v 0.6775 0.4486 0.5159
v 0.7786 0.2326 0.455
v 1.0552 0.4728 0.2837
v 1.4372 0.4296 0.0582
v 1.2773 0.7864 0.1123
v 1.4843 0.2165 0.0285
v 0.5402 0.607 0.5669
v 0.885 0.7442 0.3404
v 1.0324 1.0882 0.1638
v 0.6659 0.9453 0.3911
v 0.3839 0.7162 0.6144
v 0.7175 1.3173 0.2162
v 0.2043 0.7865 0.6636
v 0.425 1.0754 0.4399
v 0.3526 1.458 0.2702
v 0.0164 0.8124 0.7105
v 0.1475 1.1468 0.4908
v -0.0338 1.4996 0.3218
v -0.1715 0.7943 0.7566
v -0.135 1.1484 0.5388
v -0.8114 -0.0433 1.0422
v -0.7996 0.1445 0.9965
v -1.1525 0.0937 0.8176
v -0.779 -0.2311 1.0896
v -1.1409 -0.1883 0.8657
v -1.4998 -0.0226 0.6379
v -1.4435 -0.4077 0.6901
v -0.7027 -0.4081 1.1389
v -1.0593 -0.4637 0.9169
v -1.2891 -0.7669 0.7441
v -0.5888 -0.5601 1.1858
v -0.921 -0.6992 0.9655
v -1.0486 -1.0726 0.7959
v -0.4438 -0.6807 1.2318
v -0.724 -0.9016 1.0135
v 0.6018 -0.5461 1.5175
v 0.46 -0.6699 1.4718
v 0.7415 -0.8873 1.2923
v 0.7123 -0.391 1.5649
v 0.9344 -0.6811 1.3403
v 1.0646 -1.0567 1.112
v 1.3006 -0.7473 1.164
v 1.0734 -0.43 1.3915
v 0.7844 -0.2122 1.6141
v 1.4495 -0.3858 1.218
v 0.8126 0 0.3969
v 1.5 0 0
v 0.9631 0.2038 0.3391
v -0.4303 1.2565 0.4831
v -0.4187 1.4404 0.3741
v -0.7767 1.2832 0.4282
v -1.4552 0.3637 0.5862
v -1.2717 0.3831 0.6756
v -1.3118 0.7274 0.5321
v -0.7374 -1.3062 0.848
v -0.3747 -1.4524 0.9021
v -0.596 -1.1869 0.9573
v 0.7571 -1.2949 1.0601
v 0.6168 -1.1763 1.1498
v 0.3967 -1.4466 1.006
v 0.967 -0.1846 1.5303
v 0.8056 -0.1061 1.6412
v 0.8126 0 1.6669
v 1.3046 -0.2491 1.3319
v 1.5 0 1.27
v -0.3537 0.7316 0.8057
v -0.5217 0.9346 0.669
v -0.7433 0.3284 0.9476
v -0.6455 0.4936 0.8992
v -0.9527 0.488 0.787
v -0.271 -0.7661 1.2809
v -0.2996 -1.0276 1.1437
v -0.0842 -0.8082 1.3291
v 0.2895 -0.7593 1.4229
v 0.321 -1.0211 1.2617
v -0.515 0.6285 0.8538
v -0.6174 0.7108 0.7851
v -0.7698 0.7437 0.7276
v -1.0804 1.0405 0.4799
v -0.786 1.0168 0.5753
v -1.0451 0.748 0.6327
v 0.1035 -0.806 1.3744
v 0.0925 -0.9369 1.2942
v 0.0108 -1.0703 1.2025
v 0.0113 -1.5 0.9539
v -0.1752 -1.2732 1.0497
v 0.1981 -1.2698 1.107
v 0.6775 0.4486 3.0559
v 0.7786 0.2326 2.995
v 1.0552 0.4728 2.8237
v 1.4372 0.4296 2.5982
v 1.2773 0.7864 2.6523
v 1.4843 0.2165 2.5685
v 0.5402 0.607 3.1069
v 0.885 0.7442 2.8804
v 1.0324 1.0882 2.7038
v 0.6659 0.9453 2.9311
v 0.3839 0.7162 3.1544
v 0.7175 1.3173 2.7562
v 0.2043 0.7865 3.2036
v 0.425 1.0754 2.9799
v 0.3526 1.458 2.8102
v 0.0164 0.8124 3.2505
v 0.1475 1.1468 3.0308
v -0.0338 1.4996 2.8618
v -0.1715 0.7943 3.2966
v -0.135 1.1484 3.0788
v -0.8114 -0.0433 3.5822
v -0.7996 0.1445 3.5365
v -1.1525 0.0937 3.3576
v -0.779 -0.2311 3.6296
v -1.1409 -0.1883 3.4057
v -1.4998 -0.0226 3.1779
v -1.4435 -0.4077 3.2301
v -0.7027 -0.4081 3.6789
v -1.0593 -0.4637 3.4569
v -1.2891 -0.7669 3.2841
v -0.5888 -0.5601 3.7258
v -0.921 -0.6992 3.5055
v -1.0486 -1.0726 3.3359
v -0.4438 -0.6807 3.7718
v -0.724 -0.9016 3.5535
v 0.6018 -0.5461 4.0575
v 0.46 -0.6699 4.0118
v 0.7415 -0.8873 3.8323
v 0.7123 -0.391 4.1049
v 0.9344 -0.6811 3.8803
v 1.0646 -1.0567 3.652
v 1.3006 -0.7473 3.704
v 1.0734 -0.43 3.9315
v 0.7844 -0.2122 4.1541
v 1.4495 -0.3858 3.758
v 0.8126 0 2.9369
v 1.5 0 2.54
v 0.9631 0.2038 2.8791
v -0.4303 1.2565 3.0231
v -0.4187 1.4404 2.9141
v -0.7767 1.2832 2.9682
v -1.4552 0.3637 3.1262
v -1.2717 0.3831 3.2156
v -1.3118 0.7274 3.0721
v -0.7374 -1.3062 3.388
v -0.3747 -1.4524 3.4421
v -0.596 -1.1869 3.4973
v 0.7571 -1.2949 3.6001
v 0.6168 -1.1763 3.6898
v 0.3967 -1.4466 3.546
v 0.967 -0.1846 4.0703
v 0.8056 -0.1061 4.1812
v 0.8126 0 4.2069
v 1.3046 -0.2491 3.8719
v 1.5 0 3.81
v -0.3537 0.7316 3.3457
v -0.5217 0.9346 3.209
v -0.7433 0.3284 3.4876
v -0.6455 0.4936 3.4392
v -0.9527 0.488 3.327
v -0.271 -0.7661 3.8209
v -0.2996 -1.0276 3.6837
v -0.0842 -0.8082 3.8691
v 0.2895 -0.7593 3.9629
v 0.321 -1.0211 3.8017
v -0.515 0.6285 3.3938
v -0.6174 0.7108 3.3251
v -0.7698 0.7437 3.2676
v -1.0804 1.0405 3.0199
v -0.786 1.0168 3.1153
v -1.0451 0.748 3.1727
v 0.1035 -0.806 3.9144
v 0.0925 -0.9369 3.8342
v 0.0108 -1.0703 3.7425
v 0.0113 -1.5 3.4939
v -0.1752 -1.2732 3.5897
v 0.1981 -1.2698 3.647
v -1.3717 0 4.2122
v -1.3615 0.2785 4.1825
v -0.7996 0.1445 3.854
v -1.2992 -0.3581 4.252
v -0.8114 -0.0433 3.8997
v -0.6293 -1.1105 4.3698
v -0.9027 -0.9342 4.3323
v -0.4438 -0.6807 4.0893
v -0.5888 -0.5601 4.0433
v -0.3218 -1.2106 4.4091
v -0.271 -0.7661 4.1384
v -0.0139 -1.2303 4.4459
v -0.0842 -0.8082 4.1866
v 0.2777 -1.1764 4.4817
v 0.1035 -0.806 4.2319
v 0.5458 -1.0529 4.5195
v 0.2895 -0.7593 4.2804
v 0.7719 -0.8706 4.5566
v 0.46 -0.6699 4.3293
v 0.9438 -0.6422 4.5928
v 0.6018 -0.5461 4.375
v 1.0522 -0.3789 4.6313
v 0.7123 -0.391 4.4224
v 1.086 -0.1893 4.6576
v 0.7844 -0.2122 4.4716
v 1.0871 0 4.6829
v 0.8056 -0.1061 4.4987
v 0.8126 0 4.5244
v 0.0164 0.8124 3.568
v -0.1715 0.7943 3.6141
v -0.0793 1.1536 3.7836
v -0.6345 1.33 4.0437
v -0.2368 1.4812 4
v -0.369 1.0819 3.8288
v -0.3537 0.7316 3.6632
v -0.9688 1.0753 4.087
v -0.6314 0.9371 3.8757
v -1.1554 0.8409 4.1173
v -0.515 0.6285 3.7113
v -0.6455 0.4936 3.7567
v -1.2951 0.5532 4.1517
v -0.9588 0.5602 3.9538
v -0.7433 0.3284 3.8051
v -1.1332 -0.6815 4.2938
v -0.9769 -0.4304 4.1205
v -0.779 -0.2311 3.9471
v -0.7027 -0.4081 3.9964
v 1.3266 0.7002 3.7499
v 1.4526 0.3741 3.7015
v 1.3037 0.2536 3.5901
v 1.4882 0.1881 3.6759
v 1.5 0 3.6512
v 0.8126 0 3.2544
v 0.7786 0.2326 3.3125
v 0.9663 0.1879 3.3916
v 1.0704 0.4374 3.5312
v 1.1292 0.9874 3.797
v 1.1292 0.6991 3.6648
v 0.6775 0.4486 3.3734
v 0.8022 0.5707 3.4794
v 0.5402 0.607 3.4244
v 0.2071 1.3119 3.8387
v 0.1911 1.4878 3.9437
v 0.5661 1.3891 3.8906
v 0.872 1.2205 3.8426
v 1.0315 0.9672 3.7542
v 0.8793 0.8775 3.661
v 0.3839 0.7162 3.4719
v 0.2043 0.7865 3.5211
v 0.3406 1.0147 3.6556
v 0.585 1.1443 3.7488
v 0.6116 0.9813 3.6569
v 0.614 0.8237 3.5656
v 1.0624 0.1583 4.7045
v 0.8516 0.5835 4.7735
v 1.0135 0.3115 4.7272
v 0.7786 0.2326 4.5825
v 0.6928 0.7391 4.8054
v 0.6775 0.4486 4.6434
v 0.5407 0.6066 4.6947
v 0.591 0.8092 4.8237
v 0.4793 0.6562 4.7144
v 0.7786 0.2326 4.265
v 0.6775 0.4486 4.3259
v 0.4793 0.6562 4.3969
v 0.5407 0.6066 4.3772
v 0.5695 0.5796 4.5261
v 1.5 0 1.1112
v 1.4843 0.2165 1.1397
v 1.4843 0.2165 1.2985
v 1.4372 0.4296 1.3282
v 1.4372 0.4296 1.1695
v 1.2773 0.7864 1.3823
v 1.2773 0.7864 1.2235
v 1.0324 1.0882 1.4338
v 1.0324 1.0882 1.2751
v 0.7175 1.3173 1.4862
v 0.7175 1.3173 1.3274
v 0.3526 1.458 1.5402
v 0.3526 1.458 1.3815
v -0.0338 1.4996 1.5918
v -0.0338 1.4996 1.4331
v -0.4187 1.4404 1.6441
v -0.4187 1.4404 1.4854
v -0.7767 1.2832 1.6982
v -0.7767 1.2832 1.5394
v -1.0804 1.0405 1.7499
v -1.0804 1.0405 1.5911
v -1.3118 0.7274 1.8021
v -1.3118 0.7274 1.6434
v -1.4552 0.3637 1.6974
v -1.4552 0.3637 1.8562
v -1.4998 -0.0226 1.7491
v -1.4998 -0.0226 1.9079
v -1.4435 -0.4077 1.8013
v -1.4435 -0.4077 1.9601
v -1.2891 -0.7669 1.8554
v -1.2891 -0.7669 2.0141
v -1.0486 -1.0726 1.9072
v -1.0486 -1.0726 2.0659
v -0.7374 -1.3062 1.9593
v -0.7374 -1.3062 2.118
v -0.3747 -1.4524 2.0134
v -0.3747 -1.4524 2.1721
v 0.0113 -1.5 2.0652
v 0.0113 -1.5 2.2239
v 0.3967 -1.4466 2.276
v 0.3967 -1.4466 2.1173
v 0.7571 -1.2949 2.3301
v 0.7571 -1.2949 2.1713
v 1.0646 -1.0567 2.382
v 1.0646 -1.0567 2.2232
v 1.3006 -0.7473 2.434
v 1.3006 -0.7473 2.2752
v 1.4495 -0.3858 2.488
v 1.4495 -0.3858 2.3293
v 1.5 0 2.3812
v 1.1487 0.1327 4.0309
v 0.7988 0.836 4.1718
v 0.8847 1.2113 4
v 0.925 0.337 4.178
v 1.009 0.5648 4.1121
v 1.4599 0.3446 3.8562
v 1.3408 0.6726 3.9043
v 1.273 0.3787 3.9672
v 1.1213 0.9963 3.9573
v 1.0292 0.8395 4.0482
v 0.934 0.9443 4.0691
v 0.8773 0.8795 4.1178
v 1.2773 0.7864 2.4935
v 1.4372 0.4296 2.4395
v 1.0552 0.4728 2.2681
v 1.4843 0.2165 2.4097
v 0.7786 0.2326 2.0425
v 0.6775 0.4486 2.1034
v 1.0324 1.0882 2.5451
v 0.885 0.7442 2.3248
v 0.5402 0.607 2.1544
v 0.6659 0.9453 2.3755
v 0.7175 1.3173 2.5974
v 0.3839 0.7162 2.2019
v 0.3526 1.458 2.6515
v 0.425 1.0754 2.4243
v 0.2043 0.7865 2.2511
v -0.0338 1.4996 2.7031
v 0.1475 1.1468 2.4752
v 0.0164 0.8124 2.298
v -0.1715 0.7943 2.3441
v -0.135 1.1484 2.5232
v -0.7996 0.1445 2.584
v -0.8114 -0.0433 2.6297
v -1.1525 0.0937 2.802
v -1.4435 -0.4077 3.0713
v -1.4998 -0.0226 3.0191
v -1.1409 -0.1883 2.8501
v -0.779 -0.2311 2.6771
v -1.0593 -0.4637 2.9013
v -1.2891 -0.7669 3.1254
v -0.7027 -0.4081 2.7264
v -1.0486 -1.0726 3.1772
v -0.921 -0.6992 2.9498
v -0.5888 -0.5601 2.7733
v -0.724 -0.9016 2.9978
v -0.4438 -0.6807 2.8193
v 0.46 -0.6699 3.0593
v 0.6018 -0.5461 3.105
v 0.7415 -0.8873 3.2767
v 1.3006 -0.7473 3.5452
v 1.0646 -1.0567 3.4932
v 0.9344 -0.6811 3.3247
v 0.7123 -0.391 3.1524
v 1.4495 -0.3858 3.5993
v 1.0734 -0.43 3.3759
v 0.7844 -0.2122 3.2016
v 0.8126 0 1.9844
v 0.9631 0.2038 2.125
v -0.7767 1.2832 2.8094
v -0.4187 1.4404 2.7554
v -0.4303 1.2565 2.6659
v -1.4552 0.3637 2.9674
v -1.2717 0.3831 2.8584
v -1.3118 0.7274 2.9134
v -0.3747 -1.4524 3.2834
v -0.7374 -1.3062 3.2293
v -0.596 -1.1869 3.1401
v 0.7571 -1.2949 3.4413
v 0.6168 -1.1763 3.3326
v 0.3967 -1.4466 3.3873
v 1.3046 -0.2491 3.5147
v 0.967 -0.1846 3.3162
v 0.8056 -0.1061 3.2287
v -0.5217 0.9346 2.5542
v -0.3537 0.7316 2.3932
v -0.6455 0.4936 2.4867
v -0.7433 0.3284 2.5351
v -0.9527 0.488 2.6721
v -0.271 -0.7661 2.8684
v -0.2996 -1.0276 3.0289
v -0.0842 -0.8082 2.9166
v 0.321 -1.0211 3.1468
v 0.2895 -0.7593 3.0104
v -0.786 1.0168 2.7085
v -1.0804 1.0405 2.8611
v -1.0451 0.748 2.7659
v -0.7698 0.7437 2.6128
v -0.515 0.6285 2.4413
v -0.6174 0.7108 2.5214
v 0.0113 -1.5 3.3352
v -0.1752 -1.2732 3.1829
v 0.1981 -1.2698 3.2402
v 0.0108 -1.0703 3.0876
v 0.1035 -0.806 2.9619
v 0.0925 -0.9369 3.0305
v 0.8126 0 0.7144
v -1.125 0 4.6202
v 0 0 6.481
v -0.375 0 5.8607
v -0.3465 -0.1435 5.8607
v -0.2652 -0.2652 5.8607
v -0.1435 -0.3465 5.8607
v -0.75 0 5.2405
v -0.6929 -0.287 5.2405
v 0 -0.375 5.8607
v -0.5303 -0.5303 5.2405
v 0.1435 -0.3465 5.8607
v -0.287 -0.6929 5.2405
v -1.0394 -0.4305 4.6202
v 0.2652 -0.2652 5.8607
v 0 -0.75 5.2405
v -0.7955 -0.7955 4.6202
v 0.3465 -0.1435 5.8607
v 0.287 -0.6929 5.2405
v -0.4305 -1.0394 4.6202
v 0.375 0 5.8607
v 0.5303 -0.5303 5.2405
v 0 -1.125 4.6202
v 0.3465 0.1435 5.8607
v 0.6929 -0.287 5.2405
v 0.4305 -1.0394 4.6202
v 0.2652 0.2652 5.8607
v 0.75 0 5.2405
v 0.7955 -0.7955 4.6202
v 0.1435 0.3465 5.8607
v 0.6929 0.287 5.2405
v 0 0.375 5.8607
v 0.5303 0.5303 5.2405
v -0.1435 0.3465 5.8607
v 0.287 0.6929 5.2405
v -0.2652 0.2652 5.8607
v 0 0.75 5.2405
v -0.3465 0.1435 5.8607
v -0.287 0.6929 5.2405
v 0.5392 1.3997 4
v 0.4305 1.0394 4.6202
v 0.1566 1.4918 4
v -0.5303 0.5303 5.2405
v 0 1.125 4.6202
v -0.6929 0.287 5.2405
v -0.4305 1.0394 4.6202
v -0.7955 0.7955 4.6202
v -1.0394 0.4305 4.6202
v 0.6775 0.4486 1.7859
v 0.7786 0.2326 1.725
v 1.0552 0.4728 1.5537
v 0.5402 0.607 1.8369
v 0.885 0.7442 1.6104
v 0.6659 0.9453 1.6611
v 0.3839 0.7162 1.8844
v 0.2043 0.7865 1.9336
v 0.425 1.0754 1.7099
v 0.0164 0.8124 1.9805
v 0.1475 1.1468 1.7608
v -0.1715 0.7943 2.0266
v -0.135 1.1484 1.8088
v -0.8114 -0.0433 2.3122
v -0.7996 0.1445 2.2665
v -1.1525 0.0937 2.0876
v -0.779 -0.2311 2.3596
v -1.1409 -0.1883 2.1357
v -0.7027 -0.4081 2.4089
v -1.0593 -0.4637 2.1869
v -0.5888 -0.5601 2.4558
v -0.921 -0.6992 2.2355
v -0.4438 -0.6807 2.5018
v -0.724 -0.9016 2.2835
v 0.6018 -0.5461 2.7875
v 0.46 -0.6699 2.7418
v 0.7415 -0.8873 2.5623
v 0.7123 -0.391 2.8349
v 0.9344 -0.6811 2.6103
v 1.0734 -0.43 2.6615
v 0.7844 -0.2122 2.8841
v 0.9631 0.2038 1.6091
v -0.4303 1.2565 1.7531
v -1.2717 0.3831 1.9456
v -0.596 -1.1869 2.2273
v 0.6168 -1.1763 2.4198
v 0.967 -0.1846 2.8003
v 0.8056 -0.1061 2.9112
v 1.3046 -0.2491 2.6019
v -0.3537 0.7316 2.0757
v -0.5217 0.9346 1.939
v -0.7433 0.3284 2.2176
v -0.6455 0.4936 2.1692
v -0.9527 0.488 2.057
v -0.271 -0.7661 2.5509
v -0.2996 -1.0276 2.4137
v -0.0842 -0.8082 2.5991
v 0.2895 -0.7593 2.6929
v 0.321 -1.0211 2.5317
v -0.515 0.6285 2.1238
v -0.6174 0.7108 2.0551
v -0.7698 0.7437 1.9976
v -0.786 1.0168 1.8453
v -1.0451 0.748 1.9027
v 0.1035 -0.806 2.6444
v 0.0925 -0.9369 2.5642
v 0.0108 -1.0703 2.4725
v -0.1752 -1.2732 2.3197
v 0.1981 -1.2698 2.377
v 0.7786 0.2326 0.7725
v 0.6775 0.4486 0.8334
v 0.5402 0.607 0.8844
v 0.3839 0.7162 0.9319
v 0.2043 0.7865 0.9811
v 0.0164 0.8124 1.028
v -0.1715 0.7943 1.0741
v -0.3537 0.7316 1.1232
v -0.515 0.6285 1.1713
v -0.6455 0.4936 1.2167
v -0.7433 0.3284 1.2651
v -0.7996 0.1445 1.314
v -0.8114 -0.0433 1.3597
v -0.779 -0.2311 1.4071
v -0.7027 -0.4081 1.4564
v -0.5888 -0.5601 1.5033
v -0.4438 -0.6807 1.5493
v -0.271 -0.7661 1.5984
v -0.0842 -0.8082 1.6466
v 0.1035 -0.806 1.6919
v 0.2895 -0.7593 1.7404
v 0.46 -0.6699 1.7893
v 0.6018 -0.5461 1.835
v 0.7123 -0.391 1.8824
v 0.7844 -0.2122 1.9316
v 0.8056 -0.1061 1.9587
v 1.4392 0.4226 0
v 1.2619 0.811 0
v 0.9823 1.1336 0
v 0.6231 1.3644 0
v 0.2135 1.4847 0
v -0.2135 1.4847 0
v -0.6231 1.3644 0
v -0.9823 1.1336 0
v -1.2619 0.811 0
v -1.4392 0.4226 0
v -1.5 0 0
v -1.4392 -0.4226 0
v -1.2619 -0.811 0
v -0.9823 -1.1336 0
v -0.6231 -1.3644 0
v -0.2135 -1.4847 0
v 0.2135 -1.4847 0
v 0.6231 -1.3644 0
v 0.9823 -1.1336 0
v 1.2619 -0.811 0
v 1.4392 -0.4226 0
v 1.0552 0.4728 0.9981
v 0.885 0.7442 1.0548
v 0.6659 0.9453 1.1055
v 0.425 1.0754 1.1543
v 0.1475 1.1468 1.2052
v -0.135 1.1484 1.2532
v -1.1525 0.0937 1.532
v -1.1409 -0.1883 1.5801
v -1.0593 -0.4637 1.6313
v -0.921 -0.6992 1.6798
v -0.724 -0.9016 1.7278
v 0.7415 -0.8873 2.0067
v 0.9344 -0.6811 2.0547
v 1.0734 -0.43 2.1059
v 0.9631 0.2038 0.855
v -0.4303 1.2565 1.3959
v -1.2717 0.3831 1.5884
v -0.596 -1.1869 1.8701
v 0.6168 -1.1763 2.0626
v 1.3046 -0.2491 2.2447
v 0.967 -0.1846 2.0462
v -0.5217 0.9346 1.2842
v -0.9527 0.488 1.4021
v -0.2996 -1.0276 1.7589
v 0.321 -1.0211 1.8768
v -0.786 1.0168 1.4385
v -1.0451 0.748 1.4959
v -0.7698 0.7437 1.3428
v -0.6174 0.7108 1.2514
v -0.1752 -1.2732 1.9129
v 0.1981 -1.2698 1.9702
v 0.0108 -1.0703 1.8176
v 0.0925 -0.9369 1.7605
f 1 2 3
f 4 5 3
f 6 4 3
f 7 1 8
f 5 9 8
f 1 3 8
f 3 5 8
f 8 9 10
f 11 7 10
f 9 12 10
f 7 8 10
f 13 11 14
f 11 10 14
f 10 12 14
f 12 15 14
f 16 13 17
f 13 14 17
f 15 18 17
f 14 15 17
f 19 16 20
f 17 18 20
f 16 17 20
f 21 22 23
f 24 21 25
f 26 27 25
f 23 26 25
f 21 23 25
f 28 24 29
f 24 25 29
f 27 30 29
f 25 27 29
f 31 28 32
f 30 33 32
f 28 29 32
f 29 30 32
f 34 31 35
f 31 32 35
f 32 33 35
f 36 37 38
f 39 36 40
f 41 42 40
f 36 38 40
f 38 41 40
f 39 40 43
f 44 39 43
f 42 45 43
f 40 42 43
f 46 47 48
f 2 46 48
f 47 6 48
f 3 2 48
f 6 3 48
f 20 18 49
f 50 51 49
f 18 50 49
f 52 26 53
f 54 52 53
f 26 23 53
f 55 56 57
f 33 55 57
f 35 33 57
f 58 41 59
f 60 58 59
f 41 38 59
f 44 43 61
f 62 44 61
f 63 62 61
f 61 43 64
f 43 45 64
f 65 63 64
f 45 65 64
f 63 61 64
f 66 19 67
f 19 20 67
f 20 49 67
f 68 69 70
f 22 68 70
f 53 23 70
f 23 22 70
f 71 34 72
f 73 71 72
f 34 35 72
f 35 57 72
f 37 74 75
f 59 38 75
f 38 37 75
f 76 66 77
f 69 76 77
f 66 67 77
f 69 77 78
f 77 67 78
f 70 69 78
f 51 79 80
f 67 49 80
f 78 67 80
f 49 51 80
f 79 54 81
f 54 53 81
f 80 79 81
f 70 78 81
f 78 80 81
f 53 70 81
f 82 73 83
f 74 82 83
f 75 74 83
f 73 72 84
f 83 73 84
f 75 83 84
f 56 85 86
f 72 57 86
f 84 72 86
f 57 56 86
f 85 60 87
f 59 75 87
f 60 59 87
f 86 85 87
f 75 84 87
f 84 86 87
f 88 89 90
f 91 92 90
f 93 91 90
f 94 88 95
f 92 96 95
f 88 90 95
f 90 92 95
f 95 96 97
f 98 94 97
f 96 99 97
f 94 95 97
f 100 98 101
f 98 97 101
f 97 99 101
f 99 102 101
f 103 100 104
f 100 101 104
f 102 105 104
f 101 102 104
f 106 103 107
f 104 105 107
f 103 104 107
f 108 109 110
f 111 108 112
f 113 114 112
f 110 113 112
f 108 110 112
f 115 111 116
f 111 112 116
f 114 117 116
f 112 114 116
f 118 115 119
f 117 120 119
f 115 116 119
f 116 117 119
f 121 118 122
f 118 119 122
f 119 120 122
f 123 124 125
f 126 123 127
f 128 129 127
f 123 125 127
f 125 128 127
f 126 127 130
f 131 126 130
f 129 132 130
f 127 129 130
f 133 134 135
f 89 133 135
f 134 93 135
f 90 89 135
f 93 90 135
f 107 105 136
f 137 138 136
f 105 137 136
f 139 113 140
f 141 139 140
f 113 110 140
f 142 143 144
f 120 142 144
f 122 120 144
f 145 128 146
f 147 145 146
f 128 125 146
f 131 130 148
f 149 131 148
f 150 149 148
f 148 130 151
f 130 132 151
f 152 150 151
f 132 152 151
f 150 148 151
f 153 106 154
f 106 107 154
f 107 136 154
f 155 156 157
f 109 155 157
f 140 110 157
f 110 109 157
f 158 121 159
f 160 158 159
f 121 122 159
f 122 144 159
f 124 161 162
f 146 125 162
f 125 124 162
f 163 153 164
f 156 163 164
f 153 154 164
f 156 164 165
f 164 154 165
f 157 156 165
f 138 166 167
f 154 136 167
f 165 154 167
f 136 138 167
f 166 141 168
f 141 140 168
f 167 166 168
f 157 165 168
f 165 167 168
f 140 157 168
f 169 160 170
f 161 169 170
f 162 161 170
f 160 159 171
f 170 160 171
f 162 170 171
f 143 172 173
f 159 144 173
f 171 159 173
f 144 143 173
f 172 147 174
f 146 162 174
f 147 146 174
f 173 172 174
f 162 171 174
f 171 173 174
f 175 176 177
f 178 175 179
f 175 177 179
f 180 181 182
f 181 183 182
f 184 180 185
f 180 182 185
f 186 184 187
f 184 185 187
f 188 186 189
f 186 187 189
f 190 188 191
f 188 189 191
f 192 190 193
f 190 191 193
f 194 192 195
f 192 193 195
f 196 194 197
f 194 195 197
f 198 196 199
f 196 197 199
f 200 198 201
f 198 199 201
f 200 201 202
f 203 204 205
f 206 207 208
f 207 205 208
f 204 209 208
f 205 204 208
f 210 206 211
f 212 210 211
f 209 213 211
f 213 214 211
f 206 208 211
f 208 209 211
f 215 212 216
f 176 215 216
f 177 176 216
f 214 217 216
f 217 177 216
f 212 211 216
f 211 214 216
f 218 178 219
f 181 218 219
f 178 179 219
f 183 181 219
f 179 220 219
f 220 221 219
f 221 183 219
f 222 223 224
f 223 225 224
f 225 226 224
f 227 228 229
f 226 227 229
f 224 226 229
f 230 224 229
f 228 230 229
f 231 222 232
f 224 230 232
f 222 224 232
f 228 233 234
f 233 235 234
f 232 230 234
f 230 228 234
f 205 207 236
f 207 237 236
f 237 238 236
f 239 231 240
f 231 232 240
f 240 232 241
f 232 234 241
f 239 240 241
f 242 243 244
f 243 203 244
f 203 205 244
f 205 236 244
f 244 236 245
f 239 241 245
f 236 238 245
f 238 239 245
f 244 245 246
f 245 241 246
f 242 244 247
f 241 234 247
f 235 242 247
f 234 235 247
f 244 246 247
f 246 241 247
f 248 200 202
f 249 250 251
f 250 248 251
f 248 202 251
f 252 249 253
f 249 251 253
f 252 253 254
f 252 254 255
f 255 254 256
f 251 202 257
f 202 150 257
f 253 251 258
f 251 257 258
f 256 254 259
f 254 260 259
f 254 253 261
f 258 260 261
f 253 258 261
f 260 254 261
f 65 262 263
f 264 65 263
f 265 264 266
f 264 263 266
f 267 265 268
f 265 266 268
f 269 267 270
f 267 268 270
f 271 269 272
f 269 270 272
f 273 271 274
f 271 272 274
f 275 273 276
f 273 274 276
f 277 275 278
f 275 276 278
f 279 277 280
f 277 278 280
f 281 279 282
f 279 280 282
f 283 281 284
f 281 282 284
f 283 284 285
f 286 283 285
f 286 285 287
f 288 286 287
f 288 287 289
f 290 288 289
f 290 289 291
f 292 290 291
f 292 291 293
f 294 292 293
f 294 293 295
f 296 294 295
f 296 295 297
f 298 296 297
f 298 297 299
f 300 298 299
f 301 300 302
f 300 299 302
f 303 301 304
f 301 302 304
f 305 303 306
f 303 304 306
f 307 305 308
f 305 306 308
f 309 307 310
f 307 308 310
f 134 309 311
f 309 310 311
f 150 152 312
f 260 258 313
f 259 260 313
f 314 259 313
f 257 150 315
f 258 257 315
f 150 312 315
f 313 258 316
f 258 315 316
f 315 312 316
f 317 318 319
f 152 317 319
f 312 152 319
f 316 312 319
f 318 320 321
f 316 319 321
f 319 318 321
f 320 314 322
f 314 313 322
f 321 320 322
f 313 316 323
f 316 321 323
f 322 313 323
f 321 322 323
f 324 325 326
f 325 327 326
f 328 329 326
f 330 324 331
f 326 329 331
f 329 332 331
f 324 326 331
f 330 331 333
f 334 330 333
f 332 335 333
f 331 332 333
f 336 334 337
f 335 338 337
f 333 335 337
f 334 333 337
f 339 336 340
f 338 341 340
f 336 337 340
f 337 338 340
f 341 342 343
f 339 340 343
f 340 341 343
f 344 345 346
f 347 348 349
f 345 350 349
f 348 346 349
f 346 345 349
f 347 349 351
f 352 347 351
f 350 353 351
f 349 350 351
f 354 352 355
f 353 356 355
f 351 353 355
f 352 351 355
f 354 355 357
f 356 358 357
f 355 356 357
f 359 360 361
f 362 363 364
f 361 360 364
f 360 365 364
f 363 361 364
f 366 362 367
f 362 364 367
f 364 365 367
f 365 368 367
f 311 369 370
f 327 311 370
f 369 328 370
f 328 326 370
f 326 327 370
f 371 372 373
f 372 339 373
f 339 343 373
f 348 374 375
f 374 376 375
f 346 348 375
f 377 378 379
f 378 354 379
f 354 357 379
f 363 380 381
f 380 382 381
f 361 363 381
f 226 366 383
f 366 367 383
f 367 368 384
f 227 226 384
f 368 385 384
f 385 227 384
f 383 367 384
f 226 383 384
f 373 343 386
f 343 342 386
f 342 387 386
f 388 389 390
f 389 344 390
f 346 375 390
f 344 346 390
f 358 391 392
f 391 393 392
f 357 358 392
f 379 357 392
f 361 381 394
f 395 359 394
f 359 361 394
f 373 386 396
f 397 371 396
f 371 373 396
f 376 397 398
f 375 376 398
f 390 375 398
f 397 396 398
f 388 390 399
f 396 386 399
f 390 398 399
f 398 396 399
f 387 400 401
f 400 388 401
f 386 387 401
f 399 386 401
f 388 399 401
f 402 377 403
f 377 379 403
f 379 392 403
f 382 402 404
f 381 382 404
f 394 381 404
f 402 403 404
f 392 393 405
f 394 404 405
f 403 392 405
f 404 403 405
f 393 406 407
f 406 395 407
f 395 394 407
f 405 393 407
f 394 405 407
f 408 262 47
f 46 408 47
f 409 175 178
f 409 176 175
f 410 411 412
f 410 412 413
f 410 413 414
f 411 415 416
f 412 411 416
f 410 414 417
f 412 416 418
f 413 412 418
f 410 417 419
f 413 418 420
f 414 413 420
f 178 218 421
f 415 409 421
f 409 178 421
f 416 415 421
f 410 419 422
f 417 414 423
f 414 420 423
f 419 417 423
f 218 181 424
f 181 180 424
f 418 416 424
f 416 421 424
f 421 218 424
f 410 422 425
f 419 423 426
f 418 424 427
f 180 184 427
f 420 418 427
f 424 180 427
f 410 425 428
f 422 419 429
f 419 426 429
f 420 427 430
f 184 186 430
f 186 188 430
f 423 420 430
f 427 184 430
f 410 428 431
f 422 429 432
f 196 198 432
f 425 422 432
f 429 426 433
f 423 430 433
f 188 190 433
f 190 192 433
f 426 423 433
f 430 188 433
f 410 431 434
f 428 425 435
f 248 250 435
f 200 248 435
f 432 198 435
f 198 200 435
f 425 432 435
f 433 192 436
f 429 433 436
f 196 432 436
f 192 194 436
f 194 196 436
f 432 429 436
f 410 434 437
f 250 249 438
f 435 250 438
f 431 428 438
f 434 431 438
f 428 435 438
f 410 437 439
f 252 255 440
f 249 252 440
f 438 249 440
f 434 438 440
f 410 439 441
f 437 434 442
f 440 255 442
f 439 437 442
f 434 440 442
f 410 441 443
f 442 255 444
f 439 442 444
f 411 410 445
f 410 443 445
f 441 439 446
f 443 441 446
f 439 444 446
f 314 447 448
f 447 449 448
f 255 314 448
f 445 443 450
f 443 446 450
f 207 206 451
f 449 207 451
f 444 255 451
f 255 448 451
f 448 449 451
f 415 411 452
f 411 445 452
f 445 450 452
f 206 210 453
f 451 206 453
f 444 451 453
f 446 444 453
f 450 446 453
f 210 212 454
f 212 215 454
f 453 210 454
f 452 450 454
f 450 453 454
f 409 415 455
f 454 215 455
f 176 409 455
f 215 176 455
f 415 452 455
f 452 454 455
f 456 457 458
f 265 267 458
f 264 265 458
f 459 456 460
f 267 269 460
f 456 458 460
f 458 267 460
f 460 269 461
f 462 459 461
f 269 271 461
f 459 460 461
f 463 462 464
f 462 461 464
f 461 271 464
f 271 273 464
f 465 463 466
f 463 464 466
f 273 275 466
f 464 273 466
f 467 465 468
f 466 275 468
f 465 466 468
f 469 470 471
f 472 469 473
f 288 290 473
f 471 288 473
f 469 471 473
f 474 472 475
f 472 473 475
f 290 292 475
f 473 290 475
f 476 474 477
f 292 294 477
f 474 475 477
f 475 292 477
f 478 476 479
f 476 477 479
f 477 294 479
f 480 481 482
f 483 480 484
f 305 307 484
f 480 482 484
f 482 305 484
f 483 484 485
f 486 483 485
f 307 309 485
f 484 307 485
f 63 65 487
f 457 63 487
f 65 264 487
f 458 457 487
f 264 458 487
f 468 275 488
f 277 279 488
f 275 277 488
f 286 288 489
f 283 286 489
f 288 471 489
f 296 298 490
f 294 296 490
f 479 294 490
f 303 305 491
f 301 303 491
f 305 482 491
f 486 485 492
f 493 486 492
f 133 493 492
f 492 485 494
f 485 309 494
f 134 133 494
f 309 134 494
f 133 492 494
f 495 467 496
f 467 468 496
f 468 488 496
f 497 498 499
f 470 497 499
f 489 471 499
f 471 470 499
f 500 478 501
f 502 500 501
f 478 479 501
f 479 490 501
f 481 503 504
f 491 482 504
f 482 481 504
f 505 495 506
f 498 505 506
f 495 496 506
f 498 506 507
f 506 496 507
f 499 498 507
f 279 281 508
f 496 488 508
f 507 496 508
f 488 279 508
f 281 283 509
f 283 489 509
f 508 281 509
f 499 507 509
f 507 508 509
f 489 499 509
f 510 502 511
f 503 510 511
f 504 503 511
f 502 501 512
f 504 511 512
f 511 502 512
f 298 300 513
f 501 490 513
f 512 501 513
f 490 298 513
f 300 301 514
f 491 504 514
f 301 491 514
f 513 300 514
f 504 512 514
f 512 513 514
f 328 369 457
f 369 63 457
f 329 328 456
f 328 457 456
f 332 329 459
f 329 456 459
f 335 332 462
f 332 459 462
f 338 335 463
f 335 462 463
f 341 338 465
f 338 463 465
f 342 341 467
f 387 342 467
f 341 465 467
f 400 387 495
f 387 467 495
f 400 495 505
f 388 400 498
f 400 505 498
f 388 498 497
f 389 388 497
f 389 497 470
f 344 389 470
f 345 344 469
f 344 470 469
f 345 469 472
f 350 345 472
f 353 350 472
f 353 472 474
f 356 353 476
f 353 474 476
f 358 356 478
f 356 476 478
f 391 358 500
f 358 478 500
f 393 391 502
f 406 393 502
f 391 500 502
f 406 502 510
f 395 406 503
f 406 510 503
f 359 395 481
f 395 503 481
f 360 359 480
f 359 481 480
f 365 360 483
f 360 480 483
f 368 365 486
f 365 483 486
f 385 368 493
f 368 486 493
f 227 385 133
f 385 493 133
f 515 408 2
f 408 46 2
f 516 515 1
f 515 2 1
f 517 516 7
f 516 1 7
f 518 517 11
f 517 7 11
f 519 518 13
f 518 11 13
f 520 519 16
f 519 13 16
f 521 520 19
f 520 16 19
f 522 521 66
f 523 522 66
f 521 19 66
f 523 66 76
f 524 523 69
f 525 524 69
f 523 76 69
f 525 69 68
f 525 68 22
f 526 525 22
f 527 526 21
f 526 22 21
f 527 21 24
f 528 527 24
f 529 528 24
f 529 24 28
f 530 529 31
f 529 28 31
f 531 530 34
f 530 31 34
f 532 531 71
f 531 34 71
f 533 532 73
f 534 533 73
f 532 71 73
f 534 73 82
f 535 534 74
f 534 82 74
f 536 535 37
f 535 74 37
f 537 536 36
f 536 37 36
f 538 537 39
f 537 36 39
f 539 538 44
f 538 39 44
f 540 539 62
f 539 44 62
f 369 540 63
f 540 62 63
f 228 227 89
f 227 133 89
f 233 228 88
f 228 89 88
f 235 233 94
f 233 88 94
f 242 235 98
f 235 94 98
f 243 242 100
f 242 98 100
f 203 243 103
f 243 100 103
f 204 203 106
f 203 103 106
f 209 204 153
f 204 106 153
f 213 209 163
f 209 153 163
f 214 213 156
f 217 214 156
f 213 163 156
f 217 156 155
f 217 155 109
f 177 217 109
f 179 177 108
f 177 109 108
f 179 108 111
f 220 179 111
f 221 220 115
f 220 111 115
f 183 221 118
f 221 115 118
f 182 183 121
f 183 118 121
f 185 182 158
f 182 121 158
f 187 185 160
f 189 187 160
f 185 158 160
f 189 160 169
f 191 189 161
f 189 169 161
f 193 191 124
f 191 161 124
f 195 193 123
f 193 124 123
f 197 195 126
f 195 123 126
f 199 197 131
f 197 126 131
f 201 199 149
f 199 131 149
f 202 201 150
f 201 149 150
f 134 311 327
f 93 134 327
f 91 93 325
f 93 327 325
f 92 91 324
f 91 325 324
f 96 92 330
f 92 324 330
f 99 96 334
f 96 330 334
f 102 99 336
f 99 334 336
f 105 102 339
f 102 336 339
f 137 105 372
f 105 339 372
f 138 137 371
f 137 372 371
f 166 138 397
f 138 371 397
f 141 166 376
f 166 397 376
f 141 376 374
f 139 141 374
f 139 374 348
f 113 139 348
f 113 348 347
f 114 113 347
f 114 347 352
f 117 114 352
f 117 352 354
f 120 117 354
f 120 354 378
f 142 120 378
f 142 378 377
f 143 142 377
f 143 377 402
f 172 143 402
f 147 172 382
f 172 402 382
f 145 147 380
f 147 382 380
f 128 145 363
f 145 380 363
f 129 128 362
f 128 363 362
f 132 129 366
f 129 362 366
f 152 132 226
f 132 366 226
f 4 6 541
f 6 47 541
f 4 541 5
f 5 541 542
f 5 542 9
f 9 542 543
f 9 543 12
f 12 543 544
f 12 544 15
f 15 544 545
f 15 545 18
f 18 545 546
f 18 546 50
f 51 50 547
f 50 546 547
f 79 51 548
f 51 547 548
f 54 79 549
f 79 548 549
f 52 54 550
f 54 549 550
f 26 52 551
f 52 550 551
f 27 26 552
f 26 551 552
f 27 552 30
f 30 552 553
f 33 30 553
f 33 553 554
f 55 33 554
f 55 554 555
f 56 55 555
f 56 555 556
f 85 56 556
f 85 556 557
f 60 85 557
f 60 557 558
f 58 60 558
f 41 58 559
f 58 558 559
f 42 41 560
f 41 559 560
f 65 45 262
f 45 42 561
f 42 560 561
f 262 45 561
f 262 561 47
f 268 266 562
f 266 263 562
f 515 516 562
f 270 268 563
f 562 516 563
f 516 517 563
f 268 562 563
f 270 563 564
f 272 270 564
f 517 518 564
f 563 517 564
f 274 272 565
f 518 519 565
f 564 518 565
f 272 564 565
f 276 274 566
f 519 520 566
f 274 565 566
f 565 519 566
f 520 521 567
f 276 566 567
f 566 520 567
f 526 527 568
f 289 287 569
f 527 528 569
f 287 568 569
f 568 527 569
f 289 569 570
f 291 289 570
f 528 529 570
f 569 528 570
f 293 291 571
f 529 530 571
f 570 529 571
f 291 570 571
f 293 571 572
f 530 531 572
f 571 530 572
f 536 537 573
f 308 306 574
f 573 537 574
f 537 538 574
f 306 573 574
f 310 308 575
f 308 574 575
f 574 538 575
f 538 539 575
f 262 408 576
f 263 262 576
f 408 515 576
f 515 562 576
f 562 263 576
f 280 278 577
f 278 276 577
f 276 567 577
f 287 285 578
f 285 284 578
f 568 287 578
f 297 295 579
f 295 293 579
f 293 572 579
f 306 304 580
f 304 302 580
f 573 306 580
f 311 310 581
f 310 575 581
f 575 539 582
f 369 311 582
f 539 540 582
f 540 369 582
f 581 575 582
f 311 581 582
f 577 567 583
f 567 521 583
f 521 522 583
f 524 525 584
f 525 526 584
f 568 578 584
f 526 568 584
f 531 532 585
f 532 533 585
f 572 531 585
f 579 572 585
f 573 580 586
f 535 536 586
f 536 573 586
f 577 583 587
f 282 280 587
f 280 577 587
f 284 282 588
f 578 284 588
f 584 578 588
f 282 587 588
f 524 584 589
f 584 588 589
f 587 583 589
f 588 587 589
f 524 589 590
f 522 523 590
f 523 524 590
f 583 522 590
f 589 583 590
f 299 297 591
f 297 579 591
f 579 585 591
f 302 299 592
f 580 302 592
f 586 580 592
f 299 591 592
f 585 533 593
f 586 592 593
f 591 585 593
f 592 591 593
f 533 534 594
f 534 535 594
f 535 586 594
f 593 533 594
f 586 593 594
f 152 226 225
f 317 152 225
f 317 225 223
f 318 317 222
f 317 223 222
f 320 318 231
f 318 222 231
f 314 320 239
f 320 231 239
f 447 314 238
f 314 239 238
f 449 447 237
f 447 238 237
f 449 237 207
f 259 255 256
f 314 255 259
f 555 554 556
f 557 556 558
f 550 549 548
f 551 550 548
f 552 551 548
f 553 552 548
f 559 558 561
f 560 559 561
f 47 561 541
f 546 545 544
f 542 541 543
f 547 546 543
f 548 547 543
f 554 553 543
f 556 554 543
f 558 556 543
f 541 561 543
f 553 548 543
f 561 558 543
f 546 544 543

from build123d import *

# Parameters (mm, degrees)
SKETCH_1_R      = 1.5
EXTRUDE_1_DEPTH = 4
THREAD_1_PITCH  = 1.27


with BuildPart() as part:
    # Sketch 1 → 凸台-拉伸1 (new body)
    with BuildSketch(Plane.XY):
        Circle(SKETCH_1_R)
    extrude(amount=EXTRUDE_1_DEPTH)

    # 草图2 → 旋转1 (revolve)
    with BuildSketch(Plane(origin=(0, 0, 0), x_dir=(0, 0, -1), z_dir=(1, 0, 0)), mode=Mode.PRIVATE) as revolve_1_sk:
        Polygon((-4, 0), (-6.480992671, 0), (-4, -1.5), align=None)
    revolve(revolve_1_sk.sketch.rotate(Axis((0, 0, 4), (0, 0, 1)), 270), axis=Axis((0, 0, 4), (0, 0, 1)))

    # 螺纹线1: the profile of Sketch 1 2 profile screwed along a right-hand helix of 3.149606 turns, 8 arcs to a turn; built about Z, then put on its axis
    thread_1_z = Axis((0, 0, 0), (0, 0, 1))
    thread_1_corners = [(1.5003, 0, -0.000173205), (1.5003, 0, 1.111423202), (0.812592339, 0, 0.714374998), (0.812592339, 0, 0.396874998)]
    with BuildLine(mode=Mode.PRIVATE) as thread_1_profile:
        Line(thread_1_corners[0], thread_1_corners[1])
        Line(thread_1_corners[1], thread_1_corners[2])
        Line(thread_1_corners[2], thread_1_corners[3])
        Line(thread_1_corners[3], thread_1_corners[0])
    thread_1_cap = Face(thread_1_profile.wire())
    thread_1_turn_angles = [0, 22.5, 45, 67.5, 90, 112.5, 135, 157.5, 180, 202.5, 225, 247.5, 270, 292.5, 315, 337.5, 360]
    thread_1_turn_weights = [1, 0.9238795325112867, 1, 0.9238795325112867, 1, 0.9238795325112867, 1, 0.9238795325112867, 1, 0.9238795325112867, 1, 0.9238795325112867, 1, 0.9238795325112867, 1, 0.9238795325112867, 1]
    thread_1_turn_rails = [Edge.make_bspline([Vector(p[0], p[1], 0).rotate(thread_1_z, thread_1_turn_angles[k]) / thread_1_turn_weights[k] + Vector(0, 0, p[2] + THREAD_1_PITCH * thread_1_turn_angles[k] / 360) for k in range(17)], [0, 0, 0, 1, 1, 2, 2, 3, 3, 4, 4, 5, 5, 6, 6, 7, 7, 8, 8, 8], 2, thread_1_turn_weights) for p in thread_1_corners]
    thread_1_turn_sides = [Face.make_surface_from_curves(thread_1_turn_rails[p[0]], thread_1_turn_rails[p[1]]) for p in [(0, 1), (1, 2), (2, 3), (3, 0)]]
    thread_1_last_angles = [1080, 1102.5, 1125, 1129.429133858, 1133.858267717]
    thread_1_last_weights = [1, 0.9238795325112867, 1, 0.9970136131070448, 1]
    thread_1_last_rails = [Edge.make_bspline([Vector(p[0], p[1], 0).rotate(thread_1_z, thread_1_last_angles[k]) / thread_1_last_weights[k] + Vector(0, 0, p[2] + THREAD_1_PITCH * thread_1_last_angles[k] / 360) for k in range(5)], [0, 0, 0, 1, 1, 2, 2, 2], 2, thread_1_last_weights) for p in thread_1_corners]
    thread_1_last_sides = [Face.make_surface_from_curves(thread_1_last_rails[p[0]], thread_1_last_rails[p[1]]) for p in [(0, 1), (1, 2), (2, 3), (3, 0)]]
    thread_1 = Plane(origin=(0, 0, 0), x_dir=(1, 0, 0), z_dir=(0, 0, 1)) * Solid(Shell([*[p.moved(Location((0, 0, THREAD_1_PITCH * i))) for i in range(3) for p in thread_1_turn_sides], *thread_1_last_sides, thread_1_cap, thread_1_cap.rotate(thread_1_z, 1133.858267717).moved(Location((0, 0, THREAD_1_PITCH * 1133.858267717 / 360)))]))
    add(thread_1, mode=Mode.SUBTRACT)


solid = part.part
